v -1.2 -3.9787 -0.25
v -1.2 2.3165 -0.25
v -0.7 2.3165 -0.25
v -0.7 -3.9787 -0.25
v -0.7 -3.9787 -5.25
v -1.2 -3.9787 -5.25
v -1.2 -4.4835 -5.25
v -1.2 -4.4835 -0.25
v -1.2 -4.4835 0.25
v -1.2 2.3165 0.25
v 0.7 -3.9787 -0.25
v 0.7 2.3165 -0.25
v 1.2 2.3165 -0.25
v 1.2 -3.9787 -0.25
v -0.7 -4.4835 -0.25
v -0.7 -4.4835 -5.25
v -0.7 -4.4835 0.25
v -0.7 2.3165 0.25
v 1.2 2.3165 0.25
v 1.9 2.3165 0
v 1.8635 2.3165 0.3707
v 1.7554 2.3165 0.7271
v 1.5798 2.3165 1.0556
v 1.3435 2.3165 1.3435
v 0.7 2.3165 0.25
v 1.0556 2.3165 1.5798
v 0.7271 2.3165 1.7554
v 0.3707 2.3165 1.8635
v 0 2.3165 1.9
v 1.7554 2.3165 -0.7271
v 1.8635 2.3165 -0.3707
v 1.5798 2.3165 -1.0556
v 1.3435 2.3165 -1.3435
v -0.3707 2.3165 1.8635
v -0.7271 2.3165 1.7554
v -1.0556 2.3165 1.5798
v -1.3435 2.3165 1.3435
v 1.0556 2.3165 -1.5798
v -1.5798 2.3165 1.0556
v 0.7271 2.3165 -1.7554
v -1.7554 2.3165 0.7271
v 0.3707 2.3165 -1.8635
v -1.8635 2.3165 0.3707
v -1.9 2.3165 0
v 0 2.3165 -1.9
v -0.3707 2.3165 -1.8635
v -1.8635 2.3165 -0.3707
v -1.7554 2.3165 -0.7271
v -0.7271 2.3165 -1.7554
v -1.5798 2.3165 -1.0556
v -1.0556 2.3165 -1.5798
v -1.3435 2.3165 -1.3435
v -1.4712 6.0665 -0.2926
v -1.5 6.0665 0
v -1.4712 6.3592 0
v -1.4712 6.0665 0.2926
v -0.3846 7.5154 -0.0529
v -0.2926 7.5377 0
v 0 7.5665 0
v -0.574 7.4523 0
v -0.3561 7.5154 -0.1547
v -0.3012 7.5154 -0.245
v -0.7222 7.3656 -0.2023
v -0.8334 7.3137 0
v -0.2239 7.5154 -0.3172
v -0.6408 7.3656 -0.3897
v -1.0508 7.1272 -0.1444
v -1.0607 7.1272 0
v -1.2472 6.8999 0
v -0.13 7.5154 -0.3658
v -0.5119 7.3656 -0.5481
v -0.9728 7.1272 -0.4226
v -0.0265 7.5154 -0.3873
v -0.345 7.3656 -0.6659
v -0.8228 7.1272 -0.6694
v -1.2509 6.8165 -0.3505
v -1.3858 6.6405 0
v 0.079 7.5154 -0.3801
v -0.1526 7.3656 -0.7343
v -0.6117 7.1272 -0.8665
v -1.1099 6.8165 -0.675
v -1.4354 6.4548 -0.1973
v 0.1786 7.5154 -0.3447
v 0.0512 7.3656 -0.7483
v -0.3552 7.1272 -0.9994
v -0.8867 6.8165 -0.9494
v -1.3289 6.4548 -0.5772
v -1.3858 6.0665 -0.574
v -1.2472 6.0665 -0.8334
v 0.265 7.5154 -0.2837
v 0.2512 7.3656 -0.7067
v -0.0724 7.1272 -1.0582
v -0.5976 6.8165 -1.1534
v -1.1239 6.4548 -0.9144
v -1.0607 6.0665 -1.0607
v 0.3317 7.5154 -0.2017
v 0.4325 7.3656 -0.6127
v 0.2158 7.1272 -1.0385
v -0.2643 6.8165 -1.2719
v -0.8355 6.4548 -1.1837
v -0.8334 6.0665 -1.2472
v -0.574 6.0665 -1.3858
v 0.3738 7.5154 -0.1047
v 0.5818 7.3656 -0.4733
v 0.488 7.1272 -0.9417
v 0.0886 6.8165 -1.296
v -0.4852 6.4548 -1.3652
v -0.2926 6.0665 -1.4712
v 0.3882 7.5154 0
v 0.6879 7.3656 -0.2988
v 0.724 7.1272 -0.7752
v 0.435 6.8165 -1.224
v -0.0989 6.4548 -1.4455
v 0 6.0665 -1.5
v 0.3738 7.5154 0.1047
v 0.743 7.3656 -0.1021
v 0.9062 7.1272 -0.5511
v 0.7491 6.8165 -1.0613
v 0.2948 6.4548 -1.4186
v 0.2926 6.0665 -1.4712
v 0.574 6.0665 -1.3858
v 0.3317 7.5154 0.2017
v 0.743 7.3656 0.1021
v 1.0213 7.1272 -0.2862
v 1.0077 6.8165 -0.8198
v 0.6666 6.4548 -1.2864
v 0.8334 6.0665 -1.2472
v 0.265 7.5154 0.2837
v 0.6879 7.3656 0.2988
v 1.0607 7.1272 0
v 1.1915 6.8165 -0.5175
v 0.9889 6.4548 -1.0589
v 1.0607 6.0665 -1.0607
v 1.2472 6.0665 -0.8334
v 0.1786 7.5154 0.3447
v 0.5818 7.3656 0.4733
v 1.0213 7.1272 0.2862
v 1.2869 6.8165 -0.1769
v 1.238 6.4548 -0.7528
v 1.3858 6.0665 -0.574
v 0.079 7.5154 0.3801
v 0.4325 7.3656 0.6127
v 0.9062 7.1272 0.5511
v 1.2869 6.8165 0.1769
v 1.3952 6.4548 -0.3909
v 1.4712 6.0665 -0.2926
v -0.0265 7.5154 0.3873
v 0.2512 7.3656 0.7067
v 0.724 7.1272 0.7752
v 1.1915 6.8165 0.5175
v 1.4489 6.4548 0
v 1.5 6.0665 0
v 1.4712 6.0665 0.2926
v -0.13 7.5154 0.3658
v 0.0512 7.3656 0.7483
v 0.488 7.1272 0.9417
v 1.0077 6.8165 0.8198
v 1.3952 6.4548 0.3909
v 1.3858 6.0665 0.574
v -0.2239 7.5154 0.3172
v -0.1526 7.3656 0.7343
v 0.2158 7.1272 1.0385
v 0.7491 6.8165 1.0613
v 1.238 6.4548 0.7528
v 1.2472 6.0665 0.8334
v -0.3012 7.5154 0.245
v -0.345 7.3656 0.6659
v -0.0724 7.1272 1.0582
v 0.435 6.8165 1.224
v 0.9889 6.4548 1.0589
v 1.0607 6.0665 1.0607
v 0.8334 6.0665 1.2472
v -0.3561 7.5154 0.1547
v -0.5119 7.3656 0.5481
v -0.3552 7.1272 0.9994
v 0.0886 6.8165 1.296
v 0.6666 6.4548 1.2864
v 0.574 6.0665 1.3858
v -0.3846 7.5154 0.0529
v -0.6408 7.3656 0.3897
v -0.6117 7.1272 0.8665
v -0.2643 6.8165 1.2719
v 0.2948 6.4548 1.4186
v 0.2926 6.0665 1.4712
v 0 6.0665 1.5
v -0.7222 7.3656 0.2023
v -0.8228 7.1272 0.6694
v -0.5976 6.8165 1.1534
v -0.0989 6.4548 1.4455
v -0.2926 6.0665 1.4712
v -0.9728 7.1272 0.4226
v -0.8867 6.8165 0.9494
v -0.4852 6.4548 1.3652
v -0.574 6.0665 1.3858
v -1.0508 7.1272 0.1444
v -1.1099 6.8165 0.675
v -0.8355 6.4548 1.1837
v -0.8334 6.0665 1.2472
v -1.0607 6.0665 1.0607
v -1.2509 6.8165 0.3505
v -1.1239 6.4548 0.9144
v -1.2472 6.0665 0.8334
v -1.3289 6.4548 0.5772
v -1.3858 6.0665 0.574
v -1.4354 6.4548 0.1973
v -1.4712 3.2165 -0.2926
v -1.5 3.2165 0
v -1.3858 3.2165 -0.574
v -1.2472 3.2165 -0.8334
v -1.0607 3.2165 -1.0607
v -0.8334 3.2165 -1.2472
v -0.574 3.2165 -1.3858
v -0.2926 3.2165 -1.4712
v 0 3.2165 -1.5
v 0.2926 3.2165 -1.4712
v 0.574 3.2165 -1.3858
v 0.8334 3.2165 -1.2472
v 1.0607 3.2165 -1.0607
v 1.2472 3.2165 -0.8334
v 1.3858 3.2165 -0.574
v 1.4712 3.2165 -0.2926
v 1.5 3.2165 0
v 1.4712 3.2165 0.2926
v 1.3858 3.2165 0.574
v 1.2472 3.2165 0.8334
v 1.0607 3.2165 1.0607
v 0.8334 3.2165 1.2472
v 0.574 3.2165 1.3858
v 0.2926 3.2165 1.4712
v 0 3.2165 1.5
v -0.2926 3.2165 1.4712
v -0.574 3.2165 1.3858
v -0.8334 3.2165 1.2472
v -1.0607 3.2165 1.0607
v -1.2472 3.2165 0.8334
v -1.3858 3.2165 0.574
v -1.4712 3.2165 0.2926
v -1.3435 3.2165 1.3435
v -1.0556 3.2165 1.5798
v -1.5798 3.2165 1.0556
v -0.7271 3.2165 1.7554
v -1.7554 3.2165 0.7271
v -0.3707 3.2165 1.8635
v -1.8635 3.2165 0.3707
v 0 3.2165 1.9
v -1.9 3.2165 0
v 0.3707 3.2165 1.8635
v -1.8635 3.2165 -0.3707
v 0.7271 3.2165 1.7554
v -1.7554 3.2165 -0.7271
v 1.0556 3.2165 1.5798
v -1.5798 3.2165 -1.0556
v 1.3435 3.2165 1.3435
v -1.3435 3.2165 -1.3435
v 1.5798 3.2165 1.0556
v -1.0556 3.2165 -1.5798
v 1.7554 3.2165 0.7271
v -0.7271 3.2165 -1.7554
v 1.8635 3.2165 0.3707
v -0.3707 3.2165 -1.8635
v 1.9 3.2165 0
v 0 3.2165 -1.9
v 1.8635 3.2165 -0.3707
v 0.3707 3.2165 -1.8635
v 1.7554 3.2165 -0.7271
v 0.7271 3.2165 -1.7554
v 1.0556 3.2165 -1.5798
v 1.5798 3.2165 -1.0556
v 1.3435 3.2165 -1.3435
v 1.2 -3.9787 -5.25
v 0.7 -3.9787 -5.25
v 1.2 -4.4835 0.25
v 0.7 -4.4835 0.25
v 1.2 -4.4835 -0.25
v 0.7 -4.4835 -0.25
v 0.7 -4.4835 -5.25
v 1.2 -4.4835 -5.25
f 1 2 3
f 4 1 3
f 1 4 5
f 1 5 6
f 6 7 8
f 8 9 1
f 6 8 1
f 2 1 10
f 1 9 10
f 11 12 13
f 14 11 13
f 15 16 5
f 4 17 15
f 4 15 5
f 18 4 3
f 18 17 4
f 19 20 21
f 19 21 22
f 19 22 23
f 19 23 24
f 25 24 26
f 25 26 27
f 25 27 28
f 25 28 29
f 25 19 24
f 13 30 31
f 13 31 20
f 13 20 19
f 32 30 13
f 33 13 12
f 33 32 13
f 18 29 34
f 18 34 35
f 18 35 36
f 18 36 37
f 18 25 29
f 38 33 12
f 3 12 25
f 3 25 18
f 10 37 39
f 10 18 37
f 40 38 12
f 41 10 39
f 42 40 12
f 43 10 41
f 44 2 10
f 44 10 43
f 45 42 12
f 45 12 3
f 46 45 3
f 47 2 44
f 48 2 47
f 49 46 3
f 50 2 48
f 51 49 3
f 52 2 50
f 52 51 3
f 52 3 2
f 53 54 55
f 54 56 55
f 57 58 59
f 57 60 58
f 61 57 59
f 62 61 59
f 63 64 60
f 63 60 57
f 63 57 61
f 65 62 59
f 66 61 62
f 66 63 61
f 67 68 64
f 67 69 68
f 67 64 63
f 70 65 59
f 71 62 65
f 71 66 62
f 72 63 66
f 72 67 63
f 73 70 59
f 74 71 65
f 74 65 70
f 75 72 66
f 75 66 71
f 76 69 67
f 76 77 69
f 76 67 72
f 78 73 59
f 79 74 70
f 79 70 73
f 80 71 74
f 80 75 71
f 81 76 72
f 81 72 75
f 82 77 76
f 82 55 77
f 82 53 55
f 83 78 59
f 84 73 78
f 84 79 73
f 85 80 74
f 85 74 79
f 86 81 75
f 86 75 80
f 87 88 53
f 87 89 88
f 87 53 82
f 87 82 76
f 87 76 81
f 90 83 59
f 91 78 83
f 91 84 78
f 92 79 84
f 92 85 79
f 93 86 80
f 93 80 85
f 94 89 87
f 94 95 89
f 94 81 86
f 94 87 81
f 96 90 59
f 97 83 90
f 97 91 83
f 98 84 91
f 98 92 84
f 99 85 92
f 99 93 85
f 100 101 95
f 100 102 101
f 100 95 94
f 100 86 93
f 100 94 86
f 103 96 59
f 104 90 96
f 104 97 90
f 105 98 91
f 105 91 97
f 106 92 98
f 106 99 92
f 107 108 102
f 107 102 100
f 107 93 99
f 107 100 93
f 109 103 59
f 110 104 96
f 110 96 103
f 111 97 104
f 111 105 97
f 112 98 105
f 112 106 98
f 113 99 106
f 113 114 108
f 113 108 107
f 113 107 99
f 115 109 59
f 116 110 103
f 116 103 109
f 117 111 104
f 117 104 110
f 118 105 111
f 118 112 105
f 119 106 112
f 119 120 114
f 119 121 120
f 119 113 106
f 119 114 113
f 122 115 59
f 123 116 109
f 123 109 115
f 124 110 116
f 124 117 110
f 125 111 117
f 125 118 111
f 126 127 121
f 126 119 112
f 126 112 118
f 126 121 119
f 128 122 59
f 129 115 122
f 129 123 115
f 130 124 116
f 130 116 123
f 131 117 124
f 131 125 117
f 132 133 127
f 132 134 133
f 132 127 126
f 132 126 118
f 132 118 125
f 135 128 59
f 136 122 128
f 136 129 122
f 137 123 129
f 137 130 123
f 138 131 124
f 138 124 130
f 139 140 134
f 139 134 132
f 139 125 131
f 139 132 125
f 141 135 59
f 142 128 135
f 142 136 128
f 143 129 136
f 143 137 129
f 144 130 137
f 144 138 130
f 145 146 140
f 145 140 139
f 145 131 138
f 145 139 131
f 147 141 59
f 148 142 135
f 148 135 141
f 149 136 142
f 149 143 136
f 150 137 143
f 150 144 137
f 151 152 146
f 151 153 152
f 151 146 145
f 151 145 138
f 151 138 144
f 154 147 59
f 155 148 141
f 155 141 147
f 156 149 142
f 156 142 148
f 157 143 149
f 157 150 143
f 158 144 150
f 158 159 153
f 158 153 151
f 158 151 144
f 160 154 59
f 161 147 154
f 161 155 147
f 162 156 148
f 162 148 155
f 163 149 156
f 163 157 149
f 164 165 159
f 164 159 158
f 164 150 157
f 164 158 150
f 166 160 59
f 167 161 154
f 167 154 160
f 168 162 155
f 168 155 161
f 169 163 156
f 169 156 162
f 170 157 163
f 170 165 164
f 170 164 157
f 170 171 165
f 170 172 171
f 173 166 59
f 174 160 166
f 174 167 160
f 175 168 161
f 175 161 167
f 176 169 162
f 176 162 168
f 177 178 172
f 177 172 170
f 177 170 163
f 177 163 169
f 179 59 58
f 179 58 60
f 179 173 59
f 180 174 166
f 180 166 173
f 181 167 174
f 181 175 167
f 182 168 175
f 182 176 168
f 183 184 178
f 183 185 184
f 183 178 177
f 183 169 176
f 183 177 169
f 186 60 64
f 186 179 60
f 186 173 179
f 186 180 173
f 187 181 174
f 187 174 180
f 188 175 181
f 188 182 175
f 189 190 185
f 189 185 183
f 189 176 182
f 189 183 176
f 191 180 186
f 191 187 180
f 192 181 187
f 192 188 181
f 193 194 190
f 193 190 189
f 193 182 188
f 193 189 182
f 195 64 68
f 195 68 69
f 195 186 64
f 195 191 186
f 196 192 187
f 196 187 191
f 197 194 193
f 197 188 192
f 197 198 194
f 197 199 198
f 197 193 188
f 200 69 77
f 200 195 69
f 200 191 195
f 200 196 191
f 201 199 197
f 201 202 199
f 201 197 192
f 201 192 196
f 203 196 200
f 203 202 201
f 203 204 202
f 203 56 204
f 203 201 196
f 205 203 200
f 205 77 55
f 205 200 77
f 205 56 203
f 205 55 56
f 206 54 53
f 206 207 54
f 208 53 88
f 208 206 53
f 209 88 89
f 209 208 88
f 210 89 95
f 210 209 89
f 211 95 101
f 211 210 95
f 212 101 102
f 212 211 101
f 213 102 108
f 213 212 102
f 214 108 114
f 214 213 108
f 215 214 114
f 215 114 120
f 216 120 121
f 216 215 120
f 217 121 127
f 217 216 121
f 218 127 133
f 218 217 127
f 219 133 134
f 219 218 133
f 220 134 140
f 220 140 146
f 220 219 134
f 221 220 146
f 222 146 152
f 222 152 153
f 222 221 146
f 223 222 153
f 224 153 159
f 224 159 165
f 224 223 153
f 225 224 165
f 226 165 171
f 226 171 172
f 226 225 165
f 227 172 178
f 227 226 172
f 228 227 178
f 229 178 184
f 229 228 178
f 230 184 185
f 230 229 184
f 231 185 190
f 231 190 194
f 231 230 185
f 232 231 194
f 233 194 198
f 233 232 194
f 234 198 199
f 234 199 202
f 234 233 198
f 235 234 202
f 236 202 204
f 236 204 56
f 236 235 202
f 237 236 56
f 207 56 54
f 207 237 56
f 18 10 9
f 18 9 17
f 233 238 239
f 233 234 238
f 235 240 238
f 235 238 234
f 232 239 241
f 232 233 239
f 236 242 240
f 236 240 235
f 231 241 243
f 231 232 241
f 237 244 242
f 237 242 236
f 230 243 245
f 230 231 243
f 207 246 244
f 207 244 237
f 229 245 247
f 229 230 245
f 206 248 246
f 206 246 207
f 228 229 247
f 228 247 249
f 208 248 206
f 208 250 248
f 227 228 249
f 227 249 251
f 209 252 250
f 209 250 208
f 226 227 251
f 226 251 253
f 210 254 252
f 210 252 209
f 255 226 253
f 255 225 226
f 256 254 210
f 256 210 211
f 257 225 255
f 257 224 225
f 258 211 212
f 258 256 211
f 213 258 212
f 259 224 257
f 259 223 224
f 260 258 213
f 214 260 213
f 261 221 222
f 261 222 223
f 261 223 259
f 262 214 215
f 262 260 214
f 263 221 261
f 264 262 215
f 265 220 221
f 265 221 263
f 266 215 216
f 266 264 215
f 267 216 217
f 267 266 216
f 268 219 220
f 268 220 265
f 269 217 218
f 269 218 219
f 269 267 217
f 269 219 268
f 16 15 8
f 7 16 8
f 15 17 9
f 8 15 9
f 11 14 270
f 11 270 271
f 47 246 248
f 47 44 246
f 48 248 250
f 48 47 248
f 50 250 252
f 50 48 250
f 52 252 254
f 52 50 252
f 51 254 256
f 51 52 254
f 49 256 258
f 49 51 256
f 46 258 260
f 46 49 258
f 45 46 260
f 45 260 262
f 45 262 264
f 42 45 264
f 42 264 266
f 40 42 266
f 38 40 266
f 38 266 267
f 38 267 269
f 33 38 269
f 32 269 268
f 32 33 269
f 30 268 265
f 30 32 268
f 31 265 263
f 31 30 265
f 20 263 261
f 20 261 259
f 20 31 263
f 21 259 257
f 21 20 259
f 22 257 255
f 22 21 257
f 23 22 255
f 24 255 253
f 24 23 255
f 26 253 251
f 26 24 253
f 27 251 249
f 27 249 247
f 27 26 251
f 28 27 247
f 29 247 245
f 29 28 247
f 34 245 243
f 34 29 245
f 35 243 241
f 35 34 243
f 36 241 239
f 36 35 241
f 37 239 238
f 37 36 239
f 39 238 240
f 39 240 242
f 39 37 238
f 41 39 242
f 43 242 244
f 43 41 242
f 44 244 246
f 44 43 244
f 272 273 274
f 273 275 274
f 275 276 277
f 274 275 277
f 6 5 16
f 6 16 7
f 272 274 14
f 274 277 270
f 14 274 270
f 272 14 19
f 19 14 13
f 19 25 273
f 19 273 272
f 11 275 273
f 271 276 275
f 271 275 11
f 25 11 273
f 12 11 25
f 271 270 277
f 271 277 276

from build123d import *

# Parameters (mm, degrees)
SKICA2_W                = 0.5
SKICA2_H                = 6.8
P_IDAT_VYSUNUT_M1_DEPTH = 0.25
SKICA3_W                = 0.5
SKICA3_H                = 0.504797781
P_IDAT_VYSUNUT_M2_DEPTH = 5


with BuildPart() as part:
    # Skica1 → Rotovat1 (revolve)
    with BuildSketch(Plane.XY):
        with BuildLine():
            Line((-1.5, 6.066522781), (-1.5, 3.216522781))
            Line((-1.5, 3.216522781), (-1.9, 3.216522781))
            Line((-1.9, 3.216522781), (-1.9, 2.316522781))
            Line((-1.9, 2.316522781), (0, 2.316522781))
            Line((0, 2.316522781), (0, 7.566522781))
            ThreePointArc((0, 7.566522781), (-1.060660172, 7.127182953), (-1.5, 6.066522781))
        make_face()
    revolve(axis=Axis((0, 7.566522781, 0), (0, -1, 0)))

    # Skica2 → Přidat vysunutím1 (add, symmetric)
    with BuildSketch(Plane.XY):
        with Locations((0.95, -1.083477219)):
            Rectangle(SKICA2_W, SKICA2_H)
        with Locations((-0.95, -1.083477219)):
            Rectangle(SKICA2_W, SKICA2_H)
    extrude(amount=P_IDAT_VYSUNUT_M1_DEPTH, both=True)

    # Skica3 → Přidat vysunutím2 (add)
    with BuildSketch(Plane(origin=(0, 0, -0.25), x_dir=(-1, 0, 0), z_dir=(0, 0, -1))):
        with Locations((0.95, -4.231078329)):
            Rectangle(SKICA3_W, SKICA3_H)
        with Locations((-0.95, -4.231078329)):
            Rectangle(SKICA3_W, SKICA3_H)
    extrude(amount=P_IDAT_VYSUNUT_M2_DEPTH)


solid = part.part
